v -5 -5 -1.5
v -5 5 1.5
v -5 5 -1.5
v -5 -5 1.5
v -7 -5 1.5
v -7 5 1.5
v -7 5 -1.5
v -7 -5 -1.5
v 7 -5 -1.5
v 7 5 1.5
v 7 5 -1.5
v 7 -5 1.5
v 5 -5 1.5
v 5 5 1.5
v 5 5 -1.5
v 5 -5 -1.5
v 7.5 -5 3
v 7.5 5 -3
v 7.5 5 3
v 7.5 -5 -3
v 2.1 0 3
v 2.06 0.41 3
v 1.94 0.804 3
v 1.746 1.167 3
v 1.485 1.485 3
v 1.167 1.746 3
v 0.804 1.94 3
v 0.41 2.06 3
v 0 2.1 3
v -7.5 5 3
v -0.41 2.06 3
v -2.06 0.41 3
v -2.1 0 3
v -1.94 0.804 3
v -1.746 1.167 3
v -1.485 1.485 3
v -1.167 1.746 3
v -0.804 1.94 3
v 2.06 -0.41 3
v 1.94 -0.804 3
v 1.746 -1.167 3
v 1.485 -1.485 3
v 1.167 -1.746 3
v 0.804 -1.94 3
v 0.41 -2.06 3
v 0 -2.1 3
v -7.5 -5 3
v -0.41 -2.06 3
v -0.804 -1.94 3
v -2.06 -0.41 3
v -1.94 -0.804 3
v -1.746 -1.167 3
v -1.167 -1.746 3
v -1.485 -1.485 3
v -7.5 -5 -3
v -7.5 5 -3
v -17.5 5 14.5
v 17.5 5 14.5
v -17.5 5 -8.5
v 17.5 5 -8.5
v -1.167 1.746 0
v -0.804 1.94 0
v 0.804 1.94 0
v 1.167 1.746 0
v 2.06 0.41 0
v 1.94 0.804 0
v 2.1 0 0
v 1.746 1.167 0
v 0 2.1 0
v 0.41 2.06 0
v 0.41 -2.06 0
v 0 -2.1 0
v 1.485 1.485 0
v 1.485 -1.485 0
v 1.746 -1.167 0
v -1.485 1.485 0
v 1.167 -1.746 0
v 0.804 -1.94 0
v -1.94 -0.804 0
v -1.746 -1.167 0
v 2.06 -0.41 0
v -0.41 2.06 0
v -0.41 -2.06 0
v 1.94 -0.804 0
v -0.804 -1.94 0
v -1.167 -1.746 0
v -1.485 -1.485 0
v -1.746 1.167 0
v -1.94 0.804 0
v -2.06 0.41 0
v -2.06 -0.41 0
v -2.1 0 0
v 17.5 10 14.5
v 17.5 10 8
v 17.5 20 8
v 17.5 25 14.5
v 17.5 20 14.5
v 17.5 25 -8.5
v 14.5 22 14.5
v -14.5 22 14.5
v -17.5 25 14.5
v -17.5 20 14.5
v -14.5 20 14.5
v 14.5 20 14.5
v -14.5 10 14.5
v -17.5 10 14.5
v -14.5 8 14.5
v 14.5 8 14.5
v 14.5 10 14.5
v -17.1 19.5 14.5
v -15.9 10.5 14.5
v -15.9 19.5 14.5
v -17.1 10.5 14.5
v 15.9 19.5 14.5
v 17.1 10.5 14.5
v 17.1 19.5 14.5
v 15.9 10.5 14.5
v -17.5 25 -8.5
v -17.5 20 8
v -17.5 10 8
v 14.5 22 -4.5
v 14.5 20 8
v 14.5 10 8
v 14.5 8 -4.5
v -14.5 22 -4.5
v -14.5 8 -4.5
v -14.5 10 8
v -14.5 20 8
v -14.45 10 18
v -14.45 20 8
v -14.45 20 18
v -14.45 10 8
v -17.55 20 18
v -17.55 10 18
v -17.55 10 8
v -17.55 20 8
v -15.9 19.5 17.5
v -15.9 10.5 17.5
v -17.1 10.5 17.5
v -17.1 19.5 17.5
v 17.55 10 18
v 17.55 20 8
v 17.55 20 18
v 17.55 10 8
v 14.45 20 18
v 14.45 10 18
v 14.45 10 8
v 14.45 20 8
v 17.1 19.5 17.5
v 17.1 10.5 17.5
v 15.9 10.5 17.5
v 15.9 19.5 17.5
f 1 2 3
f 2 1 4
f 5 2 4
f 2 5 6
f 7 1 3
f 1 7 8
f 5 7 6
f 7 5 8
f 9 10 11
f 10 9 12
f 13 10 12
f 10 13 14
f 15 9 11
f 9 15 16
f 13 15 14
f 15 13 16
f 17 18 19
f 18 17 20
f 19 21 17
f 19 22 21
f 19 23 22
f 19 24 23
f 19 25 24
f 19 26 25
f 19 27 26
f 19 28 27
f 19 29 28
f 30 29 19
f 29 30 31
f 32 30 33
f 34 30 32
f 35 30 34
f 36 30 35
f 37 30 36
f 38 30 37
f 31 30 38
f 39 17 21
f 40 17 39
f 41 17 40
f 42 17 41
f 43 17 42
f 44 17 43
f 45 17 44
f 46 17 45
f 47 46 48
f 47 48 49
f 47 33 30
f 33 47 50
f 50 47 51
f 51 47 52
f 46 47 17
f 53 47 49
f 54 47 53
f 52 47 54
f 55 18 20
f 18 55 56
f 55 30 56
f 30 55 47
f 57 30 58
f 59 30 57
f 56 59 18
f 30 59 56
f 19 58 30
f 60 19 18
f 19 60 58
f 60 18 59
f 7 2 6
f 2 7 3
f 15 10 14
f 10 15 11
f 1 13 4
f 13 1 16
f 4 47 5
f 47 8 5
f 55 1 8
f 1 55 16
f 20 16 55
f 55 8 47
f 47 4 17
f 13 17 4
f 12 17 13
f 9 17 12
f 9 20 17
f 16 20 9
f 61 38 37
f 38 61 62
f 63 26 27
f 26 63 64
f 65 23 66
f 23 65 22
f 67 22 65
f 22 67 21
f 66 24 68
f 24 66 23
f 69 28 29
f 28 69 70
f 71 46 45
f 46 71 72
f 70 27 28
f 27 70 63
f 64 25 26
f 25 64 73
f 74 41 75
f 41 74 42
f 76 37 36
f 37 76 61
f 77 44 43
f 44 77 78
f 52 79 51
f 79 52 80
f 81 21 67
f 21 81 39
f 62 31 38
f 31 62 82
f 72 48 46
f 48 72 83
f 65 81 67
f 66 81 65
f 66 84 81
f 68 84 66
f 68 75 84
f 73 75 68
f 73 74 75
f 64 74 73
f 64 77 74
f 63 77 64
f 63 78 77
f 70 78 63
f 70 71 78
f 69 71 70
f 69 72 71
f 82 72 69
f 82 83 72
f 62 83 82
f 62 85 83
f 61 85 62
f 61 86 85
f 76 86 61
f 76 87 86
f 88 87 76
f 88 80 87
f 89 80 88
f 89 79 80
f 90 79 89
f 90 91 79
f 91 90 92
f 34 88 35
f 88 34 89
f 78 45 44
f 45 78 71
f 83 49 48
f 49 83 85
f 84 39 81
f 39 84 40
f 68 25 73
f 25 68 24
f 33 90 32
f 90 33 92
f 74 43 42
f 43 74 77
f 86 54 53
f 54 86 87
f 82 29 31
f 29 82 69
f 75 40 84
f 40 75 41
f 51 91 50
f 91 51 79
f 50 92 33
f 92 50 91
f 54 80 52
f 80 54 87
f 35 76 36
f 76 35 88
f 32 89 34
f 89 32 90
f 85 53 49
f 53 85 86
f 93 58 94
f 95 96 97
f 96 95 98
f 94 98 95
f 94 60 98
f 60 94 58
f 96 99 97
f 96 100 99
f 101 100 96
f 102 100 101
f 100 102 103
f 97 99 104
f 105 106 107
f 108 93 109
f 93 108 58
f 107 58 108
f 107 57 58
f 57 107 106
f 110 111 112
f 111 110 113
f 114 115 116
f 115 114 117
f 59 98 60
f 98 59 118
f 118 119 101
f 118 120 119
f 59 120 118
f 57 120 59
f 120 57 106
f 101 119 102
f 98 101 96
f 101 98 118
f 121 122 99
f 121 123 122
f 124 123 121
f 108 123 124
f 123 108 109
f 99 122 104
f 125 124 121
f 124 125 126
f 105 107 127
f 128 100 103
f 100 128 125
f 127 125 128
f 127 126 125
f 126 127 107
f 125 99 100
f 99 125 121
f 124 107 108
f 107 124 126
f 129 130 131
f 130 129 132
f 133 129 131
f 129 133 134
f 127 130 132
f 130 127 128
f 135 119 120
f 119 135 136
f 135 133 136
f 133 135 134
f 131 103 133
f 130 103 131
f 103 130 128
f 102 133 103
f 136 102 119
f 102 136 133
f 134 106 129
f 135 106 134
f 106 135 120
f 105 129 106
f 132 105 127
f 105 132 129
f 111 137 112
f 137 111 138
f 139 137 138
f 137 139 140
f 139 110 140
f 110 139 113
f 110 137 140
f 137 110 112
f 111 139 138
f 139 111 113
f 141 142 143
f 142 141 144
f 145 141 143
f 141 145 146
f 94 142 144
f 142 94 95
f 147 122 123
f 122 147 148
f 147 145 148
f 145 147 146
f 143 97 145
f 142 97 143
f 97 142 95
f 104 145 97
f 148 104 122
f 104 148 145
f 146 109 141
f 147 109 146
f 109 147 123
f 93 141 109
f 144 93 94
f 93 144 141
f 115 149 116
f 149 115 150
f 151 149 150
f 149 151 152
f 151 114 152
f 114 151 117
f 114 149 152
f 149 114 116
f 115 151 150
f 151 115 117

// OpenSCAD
// AstraAnt Tool: Cargo Gripper
// Print in PETG. Glue silicone grip pads to jaw faces.
// Passive — mandibles provide all grip force.
//
// Print orientation: jaw-side up
// Supports: none needed

$fn = 32;


// Universal magnetic mount interface
// Clips between ant mandibles, held by neodymium magnets
module magnetic_mount(width=15, depth=10, magnet_d=4) {
    difference() {
        // Mount body
        cube([width, depth, 6], center=true);
        // Magnet pocket (recessed)
        translate([0, 0, 1.5])
            cylinder(d=4+0.2, h=3, center=true, $fn=32);
        // Mandible grip grooves (two channels for ant mandibles)
        for (side = [-1, 1]) {
            translate([side * (width/2 - 1.5), 0, 0])
                cube([2, depth+1, 3], center=true);
        }
    }
}


// Parameters
jaw_width = 35;
jaw_opening = 40;
jaw_depth = 20;
wall = 3;
grip_pad_area = 10;  // Size of silicone pad bonding area

module gripper_jaw() {
    // U-shaped fork
    difference() {
        cube([jaw_width, jaw_depth, jaw_opening/2 + wall], center=true);
        // Inner cavity
        translate([0, 0, wall])
            cube([jaw_width - 2*wall, jaw_depth - 2*wall, jaw_opening/2 + 1], center=true);
    }
    // Grip pad recesses (for silicone pads)
    for (side = [-1, 1]) {
        translate([side * (jaw_width/2 - wall/2), 0, jaw_opening/4]) {
            difference() {
                cube([wall + 0.1, grip_pad_area, grip_pad_area], center=true);
                // Shallow recess for pad
                translate([side * 0.5, 0, 0])
                    cube([1.2, grip_pad_area - 1, grip_pad_area - 1], center=true);
            }
        }
    }
}

module cargo_gripper_assembly() {
    magnetic_mount();
    translate([0, jaw_depth/2 + 5, 3])
        gripper_jaw();
}

cargo_gripper_assembly();
